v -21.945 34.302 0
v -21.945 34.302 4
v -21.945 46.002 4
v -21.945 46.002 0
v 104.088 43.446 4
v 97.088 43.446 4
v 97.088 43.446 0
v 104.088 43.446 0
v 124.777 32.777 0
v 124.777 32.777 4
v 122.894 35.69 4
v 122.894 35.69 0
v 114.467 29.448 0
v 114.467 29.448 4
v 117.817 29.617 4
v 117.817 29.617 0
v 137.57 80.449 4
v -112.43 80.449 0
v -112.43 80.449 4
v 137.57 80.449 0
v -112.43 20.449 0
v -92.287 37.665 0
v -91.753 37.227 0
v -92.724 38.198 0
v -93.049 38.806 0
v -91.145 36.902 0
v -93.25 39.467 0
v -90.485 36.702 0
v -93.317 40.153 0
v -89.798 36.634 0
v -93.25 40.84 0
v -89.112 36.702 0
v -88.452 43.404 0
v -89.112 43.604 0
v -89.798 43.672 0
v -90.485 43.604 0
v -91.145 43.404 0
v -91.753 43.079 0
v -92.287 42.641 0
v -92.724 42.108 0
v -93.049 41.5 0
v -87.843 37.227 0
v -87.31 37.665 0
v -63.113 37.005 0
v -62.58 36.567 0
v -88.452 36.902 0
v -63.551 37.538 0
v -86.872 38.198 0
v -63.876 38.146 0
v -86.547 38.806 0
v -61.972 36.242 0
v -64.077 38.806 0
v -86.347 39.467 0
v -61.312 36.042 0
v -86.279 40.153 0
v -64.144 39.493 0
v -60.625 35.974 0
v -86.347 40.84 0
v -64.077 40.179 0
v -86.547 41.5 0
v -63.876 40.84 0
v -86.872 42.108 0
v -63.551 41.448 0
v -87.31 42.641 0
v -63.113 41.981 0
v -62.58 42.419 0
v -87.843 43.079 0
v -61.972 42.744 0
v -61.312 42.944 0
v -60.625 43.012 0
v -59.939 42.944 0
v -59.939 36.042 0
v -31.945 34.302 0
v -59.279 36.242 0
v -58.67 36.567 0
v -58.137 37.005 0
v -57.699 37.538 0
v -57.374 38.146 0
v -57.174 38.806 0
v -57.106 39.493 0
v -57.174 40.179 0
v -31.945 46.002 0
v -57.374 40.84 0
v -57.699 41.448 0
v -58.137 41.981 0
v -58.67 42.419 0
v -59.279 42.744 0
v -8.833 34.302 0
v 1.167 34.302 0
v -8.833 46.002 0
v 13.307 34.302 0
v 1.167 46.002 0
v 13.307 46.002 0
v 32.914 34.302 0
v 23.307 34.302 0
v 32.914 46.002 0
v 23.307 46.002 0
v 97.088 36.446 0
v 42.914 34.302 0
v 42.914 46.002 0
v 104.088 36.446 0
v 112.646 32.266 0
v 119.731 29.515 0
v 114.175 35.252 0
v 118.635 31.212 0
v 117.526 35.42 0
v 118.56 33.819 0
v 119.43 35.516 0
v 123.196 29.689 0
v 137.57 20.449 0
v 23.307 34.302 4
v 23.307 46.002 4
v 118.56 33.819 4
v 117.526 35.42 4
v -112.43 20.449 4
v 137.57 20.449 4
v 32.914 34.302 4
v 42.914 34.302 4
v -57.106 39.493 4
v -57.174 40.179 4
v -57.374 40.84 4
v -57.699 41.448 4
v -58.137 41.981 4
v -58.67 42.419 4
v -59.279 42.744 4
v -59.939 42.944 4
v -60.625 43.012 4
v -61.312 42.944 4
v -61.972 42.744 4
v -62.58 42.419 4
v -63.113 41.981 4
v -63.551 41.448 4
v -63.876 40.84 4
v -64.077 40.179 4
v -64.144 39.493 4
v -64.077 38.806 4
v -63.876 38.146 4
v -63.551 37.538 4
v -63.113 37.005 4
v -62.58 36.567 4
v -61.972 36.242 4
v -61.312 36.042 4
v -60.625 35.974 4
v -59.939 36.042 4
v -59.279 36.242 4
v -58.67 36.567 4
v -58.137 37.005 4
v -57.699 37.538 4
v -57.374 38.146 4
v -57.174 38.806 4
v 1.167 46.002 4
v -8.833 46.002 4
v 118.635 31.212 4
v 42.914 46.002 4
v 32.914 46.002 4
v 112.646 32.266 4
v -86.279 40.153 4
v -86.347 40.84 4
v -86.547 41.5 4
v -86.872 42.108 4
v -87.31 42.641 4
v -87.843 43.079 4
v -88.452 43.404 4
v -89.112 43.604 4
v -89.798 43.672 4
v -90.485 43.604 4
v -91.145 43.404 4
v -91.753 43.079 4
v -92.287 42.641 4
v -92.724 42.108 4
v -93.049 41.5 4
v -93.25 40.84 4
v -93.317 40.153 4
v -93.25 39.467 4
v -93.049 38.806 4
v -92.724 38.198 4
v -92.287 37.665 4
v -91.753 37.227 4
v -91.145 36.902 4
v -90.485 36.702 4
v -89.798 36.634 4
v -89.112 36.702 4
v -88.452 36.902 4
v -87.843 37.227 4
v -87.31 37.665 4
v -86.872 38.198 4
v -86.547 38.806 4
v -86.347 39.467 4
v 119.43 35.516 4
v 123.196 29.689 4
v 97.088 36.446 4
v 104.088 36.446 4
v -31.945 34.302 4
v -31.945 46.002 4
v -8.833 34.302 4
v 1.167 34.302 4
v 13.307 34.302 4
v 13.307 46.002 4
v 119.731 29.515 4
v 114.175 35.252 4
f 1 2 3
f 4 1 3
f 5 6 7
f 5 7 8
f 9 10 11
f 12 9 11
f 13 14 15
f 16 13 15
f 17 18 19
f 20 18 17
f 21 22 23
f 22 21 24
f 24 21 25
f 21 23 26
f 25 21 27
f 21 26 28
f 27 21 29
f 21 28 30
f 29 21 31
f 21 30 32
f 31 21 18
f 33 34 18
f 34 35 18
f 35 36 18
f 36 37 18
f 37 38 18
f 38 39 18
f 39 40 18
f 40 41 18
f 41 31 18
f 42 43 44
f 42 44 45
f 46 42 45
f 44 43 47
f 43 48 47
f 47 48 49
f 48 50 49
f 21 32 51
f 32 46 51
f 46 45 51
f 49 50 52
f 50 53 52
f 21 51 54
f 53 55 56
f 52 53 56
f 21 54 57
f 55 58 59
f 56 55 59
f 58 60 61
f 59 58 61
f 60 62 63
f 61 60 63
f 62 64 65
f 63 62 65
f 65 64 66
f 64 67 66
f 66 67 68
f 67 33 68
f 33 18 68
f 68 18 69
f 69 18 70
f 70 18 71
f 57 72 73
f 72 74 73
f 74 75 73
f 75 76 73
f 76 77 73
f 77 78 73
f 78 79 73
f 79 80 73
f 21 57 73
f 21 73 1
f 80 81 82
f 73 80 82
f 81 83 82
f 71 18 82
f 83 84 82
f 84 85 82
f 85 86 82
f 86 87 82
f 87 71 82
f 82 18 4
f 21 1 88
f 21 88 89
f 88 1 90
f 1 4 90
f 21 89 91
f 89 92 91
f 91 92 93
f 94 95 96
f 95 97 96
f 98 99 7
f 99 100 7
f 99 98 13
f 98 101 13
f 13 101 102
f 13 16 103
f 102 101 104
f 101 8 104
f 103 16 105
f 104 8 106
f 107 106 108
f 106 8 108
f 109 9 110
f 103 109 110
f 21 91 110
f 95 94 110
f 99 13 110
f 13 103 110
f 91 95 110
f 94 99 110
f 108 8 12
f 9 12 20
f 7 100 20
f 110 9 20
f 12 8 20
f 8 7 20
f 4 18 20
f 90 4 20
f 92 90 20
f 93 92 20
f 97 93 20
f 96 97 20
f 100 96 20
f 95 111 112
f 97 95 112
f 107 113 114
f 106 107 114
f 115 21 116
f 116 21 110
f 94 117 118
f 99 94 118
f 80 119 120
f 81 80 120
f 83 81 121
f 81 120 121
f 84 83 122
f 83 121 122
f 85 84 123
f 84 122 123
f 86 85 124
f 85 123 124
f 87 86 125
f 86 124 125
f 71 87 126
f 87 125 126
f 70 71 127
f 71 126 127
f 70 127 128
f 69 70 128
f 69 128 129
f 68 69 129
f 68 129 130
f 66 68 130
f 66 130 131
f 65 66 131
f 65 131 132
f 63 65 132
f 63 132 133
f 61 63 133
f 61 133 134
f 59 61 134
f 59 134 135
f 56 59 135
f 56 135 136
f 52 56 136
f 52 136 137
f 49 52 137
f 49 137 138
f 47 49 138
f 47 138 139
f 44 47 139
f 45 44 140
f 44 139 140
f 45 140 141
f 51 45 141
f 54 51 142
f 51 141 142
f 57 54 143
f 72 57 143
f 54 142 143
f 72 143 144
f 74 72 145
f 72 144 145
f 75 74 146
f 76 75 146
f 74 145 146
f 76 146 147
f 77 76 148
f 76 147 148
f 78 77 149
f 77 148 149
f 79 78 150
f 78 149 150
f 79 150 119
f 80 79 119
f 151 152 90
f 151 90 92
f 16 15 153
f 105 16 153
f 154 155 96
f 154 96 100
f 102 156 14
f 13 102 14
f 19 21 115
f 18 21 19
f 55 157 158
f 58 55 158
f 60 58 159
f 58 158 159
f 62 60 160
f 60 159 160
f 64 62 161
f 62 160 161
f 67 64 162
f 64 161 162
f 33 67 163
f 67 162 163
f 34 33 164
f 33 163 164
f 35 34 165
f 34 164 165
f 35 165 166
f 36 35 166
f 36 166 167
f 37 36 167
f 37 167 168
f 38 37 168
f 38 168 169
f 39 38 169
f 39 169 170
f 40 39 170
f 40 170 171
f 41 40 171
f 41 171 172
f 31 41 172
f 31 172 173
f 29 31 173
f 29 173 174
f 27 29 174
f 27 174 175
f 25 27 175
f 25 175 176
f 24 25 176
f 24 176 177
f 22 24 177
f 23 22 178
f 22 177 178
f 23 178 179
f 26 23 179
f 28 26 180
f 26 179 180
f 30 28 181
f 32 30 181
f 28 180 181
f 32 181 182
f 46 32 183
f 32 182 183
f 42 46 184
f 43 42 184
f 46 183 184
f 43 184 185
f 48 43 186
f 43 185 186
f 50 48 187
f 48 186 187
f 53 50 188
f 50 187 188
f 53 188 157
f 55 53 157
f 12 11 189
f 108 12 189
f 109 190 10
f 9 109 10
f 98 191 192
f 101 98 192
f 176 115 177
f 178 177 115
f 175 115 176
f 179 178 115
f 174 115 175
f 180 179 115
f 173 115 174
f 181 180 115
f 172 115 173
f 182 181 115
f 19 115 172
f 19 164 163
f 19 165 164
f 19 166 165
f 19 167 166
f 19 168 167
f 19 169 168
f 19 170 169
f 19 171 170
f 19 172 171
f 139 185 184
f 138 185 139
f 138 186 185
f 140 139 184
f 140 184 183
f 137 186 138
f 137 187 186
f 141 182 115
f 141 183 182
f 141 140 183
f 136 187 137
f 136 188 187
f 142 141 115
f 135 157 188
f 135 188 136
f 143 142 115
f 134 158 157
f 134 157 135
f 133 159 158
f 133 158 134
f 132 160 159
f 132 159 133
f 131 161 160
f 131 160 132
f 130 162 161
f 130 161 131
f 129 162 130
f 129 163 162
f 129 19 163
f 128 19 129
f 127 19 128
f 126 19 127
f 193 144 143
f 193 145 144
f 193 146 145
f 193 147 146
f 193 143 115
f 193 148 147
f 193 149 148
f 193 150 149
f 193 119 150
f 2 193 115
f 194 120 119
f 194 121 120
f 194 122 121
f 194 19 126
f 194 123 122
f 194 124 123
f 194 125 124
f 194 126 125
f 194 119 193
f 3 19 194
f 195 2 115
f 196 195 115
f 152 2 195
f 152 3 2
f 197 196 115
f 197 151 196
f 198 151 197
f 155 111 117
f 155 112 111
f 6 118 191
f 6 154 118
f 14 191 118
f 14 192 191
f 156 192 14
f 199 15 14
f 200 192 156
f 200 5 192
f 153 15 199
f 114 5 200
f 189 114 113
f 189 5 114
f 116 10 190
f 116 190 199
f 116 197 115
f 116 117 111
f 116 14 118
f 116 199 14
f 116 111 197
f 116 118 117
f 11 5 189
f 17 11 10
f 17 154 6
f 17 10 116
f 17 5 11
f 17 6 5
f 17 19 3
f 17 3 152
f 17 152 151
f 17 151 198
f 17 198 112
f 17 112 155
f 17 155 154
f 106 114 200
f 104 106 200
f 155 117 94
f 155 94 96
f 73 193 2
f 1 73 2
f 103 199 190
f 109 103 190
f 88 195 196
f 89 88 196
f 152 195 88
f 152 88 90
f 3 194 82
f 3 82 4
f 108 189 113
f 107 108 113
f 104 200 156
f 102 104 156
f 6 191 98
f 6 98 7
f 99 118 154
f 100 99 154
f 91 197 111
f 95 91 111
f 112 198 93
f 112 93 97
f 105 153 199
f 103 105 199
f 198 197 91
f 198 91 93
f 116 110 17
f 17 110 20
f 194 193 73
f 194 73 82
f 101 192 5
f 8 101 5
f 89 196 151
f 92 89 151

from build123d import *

# Parameters (mm, degrees)
SKETCH1_W           = 250
SKETCH1_H           = 60
BOSS_EXTRUDE1_DEPTH = 4
SKETCH3_R           = 3.51887986
CUT_EXTRUDE1_DEPTH  = 10
SKETCH4_W           = 10
SKETCH4_H           = 11.7
CUT_EXTRUDE2_DEPTH  = 10
SKETCH5_W           = 7
SKETCH5_H           = 7
CUT_EXTRUDE3_DEPTH  = 10
CUT_EXTRUDE4_DEPTH  = 10


with BuildPart() as part:
    # Sketch1 → Boss-Extrude1 (new body)
    with BuildSketch(Plane.XY):
        with Locations((12.569832402, 50.449192367)):
            Rectangle(SKETCH1_W, SKETCH1_H)
    extrude(amount=BOSS_EXTRUDE1_DEPTH)

    # Sketch3 → Cut-Extrude1 (cut)
    with BuildSketch(Plane.XY.offset(4)):
        with Locations((-89.798295426, 40.153008957)):
            Circle(SKETCH3_R)
        with Locations((-117.322145335, -107.100984963)):
            Circle(SKETCH3_R)
        with Locations((-60.625269482, 39.492893663)):
            Circle(SKETCH3_R)
    extrude(amount=-CUT_EXTRUDE1_DEPTH, mode=Mode.SUBTRACT)

    # Sketch4 → Cut-Extrude2 (cut)
    with BuildSketch(Plane.XY.offset(4)):
        with Locations((-3.832712542, 40.15230201)):
            Rectangle(SKETCH4_W, SKETCH4_H)
        with Locations((-26.944599832, 40.15230201)):
            Rectangle(SKETCH4_W, SKETCH4_H)
        with Locations((37.914072819, 40.15230201)):
            Rectangle(SKETCH4_W, SKETCH4_H)
        with Locations((18.306555148, 40.15230201)):
            Rectangle(SKETCH4_W, SKETCH4_H)
    extrude(amount=-CUT_EXTRUDE2_DEPTH, mode=Mode.SUBTRACT)

    # Sketch5 → Cut-Extrude3 (cut)
    with BuildSketch(Plane.XY.offset(4)):
        with Locations((100.58753259, 39.945504984)):
            Rectangle(SKETCH5_W, SKETCH5_H)
    extrude(amount=-CUT_EXTRUDE3_DEPTH, mode=Mode.SUBTRACT)

    # Sketch6 → Cut-Extrude4 (cut)
    with BuildSketch(Plane.XY.offset(4)):
        Polygon((118.560482945, 33.81903225), (117.525576266, 35.420059377), (114.174927615, 35.251571832), (112.645517783, 32.265581209), (114.466756603, 29.44807813), (117.817405254, 29.616565675), (118.634511019, 31.211867406), (117.848178879, 32.428343358), align=None)
        Polygon((119.42955977, 35.515801288), (118.560482945, 33.81903225), (119.346815086, 32.602556298), (118.634511019, 31.211867406), (119.731305434, 29.515098368), (123.19581288, 29.689311308), (124.777193772, 32.776769239), (122.894067216, 35.690014229), align=None)
        Polygon((119.346815086, 32.602556298), (118.560482945, 33.81903225), (117.848178879, 32.428343358), (118.634511019, 31.211867406), align=None)
    extrude(amount=-CUT_EXTRUDE4_DEPTH, mode=Mode.SUBTRACT)


solid = part.part
